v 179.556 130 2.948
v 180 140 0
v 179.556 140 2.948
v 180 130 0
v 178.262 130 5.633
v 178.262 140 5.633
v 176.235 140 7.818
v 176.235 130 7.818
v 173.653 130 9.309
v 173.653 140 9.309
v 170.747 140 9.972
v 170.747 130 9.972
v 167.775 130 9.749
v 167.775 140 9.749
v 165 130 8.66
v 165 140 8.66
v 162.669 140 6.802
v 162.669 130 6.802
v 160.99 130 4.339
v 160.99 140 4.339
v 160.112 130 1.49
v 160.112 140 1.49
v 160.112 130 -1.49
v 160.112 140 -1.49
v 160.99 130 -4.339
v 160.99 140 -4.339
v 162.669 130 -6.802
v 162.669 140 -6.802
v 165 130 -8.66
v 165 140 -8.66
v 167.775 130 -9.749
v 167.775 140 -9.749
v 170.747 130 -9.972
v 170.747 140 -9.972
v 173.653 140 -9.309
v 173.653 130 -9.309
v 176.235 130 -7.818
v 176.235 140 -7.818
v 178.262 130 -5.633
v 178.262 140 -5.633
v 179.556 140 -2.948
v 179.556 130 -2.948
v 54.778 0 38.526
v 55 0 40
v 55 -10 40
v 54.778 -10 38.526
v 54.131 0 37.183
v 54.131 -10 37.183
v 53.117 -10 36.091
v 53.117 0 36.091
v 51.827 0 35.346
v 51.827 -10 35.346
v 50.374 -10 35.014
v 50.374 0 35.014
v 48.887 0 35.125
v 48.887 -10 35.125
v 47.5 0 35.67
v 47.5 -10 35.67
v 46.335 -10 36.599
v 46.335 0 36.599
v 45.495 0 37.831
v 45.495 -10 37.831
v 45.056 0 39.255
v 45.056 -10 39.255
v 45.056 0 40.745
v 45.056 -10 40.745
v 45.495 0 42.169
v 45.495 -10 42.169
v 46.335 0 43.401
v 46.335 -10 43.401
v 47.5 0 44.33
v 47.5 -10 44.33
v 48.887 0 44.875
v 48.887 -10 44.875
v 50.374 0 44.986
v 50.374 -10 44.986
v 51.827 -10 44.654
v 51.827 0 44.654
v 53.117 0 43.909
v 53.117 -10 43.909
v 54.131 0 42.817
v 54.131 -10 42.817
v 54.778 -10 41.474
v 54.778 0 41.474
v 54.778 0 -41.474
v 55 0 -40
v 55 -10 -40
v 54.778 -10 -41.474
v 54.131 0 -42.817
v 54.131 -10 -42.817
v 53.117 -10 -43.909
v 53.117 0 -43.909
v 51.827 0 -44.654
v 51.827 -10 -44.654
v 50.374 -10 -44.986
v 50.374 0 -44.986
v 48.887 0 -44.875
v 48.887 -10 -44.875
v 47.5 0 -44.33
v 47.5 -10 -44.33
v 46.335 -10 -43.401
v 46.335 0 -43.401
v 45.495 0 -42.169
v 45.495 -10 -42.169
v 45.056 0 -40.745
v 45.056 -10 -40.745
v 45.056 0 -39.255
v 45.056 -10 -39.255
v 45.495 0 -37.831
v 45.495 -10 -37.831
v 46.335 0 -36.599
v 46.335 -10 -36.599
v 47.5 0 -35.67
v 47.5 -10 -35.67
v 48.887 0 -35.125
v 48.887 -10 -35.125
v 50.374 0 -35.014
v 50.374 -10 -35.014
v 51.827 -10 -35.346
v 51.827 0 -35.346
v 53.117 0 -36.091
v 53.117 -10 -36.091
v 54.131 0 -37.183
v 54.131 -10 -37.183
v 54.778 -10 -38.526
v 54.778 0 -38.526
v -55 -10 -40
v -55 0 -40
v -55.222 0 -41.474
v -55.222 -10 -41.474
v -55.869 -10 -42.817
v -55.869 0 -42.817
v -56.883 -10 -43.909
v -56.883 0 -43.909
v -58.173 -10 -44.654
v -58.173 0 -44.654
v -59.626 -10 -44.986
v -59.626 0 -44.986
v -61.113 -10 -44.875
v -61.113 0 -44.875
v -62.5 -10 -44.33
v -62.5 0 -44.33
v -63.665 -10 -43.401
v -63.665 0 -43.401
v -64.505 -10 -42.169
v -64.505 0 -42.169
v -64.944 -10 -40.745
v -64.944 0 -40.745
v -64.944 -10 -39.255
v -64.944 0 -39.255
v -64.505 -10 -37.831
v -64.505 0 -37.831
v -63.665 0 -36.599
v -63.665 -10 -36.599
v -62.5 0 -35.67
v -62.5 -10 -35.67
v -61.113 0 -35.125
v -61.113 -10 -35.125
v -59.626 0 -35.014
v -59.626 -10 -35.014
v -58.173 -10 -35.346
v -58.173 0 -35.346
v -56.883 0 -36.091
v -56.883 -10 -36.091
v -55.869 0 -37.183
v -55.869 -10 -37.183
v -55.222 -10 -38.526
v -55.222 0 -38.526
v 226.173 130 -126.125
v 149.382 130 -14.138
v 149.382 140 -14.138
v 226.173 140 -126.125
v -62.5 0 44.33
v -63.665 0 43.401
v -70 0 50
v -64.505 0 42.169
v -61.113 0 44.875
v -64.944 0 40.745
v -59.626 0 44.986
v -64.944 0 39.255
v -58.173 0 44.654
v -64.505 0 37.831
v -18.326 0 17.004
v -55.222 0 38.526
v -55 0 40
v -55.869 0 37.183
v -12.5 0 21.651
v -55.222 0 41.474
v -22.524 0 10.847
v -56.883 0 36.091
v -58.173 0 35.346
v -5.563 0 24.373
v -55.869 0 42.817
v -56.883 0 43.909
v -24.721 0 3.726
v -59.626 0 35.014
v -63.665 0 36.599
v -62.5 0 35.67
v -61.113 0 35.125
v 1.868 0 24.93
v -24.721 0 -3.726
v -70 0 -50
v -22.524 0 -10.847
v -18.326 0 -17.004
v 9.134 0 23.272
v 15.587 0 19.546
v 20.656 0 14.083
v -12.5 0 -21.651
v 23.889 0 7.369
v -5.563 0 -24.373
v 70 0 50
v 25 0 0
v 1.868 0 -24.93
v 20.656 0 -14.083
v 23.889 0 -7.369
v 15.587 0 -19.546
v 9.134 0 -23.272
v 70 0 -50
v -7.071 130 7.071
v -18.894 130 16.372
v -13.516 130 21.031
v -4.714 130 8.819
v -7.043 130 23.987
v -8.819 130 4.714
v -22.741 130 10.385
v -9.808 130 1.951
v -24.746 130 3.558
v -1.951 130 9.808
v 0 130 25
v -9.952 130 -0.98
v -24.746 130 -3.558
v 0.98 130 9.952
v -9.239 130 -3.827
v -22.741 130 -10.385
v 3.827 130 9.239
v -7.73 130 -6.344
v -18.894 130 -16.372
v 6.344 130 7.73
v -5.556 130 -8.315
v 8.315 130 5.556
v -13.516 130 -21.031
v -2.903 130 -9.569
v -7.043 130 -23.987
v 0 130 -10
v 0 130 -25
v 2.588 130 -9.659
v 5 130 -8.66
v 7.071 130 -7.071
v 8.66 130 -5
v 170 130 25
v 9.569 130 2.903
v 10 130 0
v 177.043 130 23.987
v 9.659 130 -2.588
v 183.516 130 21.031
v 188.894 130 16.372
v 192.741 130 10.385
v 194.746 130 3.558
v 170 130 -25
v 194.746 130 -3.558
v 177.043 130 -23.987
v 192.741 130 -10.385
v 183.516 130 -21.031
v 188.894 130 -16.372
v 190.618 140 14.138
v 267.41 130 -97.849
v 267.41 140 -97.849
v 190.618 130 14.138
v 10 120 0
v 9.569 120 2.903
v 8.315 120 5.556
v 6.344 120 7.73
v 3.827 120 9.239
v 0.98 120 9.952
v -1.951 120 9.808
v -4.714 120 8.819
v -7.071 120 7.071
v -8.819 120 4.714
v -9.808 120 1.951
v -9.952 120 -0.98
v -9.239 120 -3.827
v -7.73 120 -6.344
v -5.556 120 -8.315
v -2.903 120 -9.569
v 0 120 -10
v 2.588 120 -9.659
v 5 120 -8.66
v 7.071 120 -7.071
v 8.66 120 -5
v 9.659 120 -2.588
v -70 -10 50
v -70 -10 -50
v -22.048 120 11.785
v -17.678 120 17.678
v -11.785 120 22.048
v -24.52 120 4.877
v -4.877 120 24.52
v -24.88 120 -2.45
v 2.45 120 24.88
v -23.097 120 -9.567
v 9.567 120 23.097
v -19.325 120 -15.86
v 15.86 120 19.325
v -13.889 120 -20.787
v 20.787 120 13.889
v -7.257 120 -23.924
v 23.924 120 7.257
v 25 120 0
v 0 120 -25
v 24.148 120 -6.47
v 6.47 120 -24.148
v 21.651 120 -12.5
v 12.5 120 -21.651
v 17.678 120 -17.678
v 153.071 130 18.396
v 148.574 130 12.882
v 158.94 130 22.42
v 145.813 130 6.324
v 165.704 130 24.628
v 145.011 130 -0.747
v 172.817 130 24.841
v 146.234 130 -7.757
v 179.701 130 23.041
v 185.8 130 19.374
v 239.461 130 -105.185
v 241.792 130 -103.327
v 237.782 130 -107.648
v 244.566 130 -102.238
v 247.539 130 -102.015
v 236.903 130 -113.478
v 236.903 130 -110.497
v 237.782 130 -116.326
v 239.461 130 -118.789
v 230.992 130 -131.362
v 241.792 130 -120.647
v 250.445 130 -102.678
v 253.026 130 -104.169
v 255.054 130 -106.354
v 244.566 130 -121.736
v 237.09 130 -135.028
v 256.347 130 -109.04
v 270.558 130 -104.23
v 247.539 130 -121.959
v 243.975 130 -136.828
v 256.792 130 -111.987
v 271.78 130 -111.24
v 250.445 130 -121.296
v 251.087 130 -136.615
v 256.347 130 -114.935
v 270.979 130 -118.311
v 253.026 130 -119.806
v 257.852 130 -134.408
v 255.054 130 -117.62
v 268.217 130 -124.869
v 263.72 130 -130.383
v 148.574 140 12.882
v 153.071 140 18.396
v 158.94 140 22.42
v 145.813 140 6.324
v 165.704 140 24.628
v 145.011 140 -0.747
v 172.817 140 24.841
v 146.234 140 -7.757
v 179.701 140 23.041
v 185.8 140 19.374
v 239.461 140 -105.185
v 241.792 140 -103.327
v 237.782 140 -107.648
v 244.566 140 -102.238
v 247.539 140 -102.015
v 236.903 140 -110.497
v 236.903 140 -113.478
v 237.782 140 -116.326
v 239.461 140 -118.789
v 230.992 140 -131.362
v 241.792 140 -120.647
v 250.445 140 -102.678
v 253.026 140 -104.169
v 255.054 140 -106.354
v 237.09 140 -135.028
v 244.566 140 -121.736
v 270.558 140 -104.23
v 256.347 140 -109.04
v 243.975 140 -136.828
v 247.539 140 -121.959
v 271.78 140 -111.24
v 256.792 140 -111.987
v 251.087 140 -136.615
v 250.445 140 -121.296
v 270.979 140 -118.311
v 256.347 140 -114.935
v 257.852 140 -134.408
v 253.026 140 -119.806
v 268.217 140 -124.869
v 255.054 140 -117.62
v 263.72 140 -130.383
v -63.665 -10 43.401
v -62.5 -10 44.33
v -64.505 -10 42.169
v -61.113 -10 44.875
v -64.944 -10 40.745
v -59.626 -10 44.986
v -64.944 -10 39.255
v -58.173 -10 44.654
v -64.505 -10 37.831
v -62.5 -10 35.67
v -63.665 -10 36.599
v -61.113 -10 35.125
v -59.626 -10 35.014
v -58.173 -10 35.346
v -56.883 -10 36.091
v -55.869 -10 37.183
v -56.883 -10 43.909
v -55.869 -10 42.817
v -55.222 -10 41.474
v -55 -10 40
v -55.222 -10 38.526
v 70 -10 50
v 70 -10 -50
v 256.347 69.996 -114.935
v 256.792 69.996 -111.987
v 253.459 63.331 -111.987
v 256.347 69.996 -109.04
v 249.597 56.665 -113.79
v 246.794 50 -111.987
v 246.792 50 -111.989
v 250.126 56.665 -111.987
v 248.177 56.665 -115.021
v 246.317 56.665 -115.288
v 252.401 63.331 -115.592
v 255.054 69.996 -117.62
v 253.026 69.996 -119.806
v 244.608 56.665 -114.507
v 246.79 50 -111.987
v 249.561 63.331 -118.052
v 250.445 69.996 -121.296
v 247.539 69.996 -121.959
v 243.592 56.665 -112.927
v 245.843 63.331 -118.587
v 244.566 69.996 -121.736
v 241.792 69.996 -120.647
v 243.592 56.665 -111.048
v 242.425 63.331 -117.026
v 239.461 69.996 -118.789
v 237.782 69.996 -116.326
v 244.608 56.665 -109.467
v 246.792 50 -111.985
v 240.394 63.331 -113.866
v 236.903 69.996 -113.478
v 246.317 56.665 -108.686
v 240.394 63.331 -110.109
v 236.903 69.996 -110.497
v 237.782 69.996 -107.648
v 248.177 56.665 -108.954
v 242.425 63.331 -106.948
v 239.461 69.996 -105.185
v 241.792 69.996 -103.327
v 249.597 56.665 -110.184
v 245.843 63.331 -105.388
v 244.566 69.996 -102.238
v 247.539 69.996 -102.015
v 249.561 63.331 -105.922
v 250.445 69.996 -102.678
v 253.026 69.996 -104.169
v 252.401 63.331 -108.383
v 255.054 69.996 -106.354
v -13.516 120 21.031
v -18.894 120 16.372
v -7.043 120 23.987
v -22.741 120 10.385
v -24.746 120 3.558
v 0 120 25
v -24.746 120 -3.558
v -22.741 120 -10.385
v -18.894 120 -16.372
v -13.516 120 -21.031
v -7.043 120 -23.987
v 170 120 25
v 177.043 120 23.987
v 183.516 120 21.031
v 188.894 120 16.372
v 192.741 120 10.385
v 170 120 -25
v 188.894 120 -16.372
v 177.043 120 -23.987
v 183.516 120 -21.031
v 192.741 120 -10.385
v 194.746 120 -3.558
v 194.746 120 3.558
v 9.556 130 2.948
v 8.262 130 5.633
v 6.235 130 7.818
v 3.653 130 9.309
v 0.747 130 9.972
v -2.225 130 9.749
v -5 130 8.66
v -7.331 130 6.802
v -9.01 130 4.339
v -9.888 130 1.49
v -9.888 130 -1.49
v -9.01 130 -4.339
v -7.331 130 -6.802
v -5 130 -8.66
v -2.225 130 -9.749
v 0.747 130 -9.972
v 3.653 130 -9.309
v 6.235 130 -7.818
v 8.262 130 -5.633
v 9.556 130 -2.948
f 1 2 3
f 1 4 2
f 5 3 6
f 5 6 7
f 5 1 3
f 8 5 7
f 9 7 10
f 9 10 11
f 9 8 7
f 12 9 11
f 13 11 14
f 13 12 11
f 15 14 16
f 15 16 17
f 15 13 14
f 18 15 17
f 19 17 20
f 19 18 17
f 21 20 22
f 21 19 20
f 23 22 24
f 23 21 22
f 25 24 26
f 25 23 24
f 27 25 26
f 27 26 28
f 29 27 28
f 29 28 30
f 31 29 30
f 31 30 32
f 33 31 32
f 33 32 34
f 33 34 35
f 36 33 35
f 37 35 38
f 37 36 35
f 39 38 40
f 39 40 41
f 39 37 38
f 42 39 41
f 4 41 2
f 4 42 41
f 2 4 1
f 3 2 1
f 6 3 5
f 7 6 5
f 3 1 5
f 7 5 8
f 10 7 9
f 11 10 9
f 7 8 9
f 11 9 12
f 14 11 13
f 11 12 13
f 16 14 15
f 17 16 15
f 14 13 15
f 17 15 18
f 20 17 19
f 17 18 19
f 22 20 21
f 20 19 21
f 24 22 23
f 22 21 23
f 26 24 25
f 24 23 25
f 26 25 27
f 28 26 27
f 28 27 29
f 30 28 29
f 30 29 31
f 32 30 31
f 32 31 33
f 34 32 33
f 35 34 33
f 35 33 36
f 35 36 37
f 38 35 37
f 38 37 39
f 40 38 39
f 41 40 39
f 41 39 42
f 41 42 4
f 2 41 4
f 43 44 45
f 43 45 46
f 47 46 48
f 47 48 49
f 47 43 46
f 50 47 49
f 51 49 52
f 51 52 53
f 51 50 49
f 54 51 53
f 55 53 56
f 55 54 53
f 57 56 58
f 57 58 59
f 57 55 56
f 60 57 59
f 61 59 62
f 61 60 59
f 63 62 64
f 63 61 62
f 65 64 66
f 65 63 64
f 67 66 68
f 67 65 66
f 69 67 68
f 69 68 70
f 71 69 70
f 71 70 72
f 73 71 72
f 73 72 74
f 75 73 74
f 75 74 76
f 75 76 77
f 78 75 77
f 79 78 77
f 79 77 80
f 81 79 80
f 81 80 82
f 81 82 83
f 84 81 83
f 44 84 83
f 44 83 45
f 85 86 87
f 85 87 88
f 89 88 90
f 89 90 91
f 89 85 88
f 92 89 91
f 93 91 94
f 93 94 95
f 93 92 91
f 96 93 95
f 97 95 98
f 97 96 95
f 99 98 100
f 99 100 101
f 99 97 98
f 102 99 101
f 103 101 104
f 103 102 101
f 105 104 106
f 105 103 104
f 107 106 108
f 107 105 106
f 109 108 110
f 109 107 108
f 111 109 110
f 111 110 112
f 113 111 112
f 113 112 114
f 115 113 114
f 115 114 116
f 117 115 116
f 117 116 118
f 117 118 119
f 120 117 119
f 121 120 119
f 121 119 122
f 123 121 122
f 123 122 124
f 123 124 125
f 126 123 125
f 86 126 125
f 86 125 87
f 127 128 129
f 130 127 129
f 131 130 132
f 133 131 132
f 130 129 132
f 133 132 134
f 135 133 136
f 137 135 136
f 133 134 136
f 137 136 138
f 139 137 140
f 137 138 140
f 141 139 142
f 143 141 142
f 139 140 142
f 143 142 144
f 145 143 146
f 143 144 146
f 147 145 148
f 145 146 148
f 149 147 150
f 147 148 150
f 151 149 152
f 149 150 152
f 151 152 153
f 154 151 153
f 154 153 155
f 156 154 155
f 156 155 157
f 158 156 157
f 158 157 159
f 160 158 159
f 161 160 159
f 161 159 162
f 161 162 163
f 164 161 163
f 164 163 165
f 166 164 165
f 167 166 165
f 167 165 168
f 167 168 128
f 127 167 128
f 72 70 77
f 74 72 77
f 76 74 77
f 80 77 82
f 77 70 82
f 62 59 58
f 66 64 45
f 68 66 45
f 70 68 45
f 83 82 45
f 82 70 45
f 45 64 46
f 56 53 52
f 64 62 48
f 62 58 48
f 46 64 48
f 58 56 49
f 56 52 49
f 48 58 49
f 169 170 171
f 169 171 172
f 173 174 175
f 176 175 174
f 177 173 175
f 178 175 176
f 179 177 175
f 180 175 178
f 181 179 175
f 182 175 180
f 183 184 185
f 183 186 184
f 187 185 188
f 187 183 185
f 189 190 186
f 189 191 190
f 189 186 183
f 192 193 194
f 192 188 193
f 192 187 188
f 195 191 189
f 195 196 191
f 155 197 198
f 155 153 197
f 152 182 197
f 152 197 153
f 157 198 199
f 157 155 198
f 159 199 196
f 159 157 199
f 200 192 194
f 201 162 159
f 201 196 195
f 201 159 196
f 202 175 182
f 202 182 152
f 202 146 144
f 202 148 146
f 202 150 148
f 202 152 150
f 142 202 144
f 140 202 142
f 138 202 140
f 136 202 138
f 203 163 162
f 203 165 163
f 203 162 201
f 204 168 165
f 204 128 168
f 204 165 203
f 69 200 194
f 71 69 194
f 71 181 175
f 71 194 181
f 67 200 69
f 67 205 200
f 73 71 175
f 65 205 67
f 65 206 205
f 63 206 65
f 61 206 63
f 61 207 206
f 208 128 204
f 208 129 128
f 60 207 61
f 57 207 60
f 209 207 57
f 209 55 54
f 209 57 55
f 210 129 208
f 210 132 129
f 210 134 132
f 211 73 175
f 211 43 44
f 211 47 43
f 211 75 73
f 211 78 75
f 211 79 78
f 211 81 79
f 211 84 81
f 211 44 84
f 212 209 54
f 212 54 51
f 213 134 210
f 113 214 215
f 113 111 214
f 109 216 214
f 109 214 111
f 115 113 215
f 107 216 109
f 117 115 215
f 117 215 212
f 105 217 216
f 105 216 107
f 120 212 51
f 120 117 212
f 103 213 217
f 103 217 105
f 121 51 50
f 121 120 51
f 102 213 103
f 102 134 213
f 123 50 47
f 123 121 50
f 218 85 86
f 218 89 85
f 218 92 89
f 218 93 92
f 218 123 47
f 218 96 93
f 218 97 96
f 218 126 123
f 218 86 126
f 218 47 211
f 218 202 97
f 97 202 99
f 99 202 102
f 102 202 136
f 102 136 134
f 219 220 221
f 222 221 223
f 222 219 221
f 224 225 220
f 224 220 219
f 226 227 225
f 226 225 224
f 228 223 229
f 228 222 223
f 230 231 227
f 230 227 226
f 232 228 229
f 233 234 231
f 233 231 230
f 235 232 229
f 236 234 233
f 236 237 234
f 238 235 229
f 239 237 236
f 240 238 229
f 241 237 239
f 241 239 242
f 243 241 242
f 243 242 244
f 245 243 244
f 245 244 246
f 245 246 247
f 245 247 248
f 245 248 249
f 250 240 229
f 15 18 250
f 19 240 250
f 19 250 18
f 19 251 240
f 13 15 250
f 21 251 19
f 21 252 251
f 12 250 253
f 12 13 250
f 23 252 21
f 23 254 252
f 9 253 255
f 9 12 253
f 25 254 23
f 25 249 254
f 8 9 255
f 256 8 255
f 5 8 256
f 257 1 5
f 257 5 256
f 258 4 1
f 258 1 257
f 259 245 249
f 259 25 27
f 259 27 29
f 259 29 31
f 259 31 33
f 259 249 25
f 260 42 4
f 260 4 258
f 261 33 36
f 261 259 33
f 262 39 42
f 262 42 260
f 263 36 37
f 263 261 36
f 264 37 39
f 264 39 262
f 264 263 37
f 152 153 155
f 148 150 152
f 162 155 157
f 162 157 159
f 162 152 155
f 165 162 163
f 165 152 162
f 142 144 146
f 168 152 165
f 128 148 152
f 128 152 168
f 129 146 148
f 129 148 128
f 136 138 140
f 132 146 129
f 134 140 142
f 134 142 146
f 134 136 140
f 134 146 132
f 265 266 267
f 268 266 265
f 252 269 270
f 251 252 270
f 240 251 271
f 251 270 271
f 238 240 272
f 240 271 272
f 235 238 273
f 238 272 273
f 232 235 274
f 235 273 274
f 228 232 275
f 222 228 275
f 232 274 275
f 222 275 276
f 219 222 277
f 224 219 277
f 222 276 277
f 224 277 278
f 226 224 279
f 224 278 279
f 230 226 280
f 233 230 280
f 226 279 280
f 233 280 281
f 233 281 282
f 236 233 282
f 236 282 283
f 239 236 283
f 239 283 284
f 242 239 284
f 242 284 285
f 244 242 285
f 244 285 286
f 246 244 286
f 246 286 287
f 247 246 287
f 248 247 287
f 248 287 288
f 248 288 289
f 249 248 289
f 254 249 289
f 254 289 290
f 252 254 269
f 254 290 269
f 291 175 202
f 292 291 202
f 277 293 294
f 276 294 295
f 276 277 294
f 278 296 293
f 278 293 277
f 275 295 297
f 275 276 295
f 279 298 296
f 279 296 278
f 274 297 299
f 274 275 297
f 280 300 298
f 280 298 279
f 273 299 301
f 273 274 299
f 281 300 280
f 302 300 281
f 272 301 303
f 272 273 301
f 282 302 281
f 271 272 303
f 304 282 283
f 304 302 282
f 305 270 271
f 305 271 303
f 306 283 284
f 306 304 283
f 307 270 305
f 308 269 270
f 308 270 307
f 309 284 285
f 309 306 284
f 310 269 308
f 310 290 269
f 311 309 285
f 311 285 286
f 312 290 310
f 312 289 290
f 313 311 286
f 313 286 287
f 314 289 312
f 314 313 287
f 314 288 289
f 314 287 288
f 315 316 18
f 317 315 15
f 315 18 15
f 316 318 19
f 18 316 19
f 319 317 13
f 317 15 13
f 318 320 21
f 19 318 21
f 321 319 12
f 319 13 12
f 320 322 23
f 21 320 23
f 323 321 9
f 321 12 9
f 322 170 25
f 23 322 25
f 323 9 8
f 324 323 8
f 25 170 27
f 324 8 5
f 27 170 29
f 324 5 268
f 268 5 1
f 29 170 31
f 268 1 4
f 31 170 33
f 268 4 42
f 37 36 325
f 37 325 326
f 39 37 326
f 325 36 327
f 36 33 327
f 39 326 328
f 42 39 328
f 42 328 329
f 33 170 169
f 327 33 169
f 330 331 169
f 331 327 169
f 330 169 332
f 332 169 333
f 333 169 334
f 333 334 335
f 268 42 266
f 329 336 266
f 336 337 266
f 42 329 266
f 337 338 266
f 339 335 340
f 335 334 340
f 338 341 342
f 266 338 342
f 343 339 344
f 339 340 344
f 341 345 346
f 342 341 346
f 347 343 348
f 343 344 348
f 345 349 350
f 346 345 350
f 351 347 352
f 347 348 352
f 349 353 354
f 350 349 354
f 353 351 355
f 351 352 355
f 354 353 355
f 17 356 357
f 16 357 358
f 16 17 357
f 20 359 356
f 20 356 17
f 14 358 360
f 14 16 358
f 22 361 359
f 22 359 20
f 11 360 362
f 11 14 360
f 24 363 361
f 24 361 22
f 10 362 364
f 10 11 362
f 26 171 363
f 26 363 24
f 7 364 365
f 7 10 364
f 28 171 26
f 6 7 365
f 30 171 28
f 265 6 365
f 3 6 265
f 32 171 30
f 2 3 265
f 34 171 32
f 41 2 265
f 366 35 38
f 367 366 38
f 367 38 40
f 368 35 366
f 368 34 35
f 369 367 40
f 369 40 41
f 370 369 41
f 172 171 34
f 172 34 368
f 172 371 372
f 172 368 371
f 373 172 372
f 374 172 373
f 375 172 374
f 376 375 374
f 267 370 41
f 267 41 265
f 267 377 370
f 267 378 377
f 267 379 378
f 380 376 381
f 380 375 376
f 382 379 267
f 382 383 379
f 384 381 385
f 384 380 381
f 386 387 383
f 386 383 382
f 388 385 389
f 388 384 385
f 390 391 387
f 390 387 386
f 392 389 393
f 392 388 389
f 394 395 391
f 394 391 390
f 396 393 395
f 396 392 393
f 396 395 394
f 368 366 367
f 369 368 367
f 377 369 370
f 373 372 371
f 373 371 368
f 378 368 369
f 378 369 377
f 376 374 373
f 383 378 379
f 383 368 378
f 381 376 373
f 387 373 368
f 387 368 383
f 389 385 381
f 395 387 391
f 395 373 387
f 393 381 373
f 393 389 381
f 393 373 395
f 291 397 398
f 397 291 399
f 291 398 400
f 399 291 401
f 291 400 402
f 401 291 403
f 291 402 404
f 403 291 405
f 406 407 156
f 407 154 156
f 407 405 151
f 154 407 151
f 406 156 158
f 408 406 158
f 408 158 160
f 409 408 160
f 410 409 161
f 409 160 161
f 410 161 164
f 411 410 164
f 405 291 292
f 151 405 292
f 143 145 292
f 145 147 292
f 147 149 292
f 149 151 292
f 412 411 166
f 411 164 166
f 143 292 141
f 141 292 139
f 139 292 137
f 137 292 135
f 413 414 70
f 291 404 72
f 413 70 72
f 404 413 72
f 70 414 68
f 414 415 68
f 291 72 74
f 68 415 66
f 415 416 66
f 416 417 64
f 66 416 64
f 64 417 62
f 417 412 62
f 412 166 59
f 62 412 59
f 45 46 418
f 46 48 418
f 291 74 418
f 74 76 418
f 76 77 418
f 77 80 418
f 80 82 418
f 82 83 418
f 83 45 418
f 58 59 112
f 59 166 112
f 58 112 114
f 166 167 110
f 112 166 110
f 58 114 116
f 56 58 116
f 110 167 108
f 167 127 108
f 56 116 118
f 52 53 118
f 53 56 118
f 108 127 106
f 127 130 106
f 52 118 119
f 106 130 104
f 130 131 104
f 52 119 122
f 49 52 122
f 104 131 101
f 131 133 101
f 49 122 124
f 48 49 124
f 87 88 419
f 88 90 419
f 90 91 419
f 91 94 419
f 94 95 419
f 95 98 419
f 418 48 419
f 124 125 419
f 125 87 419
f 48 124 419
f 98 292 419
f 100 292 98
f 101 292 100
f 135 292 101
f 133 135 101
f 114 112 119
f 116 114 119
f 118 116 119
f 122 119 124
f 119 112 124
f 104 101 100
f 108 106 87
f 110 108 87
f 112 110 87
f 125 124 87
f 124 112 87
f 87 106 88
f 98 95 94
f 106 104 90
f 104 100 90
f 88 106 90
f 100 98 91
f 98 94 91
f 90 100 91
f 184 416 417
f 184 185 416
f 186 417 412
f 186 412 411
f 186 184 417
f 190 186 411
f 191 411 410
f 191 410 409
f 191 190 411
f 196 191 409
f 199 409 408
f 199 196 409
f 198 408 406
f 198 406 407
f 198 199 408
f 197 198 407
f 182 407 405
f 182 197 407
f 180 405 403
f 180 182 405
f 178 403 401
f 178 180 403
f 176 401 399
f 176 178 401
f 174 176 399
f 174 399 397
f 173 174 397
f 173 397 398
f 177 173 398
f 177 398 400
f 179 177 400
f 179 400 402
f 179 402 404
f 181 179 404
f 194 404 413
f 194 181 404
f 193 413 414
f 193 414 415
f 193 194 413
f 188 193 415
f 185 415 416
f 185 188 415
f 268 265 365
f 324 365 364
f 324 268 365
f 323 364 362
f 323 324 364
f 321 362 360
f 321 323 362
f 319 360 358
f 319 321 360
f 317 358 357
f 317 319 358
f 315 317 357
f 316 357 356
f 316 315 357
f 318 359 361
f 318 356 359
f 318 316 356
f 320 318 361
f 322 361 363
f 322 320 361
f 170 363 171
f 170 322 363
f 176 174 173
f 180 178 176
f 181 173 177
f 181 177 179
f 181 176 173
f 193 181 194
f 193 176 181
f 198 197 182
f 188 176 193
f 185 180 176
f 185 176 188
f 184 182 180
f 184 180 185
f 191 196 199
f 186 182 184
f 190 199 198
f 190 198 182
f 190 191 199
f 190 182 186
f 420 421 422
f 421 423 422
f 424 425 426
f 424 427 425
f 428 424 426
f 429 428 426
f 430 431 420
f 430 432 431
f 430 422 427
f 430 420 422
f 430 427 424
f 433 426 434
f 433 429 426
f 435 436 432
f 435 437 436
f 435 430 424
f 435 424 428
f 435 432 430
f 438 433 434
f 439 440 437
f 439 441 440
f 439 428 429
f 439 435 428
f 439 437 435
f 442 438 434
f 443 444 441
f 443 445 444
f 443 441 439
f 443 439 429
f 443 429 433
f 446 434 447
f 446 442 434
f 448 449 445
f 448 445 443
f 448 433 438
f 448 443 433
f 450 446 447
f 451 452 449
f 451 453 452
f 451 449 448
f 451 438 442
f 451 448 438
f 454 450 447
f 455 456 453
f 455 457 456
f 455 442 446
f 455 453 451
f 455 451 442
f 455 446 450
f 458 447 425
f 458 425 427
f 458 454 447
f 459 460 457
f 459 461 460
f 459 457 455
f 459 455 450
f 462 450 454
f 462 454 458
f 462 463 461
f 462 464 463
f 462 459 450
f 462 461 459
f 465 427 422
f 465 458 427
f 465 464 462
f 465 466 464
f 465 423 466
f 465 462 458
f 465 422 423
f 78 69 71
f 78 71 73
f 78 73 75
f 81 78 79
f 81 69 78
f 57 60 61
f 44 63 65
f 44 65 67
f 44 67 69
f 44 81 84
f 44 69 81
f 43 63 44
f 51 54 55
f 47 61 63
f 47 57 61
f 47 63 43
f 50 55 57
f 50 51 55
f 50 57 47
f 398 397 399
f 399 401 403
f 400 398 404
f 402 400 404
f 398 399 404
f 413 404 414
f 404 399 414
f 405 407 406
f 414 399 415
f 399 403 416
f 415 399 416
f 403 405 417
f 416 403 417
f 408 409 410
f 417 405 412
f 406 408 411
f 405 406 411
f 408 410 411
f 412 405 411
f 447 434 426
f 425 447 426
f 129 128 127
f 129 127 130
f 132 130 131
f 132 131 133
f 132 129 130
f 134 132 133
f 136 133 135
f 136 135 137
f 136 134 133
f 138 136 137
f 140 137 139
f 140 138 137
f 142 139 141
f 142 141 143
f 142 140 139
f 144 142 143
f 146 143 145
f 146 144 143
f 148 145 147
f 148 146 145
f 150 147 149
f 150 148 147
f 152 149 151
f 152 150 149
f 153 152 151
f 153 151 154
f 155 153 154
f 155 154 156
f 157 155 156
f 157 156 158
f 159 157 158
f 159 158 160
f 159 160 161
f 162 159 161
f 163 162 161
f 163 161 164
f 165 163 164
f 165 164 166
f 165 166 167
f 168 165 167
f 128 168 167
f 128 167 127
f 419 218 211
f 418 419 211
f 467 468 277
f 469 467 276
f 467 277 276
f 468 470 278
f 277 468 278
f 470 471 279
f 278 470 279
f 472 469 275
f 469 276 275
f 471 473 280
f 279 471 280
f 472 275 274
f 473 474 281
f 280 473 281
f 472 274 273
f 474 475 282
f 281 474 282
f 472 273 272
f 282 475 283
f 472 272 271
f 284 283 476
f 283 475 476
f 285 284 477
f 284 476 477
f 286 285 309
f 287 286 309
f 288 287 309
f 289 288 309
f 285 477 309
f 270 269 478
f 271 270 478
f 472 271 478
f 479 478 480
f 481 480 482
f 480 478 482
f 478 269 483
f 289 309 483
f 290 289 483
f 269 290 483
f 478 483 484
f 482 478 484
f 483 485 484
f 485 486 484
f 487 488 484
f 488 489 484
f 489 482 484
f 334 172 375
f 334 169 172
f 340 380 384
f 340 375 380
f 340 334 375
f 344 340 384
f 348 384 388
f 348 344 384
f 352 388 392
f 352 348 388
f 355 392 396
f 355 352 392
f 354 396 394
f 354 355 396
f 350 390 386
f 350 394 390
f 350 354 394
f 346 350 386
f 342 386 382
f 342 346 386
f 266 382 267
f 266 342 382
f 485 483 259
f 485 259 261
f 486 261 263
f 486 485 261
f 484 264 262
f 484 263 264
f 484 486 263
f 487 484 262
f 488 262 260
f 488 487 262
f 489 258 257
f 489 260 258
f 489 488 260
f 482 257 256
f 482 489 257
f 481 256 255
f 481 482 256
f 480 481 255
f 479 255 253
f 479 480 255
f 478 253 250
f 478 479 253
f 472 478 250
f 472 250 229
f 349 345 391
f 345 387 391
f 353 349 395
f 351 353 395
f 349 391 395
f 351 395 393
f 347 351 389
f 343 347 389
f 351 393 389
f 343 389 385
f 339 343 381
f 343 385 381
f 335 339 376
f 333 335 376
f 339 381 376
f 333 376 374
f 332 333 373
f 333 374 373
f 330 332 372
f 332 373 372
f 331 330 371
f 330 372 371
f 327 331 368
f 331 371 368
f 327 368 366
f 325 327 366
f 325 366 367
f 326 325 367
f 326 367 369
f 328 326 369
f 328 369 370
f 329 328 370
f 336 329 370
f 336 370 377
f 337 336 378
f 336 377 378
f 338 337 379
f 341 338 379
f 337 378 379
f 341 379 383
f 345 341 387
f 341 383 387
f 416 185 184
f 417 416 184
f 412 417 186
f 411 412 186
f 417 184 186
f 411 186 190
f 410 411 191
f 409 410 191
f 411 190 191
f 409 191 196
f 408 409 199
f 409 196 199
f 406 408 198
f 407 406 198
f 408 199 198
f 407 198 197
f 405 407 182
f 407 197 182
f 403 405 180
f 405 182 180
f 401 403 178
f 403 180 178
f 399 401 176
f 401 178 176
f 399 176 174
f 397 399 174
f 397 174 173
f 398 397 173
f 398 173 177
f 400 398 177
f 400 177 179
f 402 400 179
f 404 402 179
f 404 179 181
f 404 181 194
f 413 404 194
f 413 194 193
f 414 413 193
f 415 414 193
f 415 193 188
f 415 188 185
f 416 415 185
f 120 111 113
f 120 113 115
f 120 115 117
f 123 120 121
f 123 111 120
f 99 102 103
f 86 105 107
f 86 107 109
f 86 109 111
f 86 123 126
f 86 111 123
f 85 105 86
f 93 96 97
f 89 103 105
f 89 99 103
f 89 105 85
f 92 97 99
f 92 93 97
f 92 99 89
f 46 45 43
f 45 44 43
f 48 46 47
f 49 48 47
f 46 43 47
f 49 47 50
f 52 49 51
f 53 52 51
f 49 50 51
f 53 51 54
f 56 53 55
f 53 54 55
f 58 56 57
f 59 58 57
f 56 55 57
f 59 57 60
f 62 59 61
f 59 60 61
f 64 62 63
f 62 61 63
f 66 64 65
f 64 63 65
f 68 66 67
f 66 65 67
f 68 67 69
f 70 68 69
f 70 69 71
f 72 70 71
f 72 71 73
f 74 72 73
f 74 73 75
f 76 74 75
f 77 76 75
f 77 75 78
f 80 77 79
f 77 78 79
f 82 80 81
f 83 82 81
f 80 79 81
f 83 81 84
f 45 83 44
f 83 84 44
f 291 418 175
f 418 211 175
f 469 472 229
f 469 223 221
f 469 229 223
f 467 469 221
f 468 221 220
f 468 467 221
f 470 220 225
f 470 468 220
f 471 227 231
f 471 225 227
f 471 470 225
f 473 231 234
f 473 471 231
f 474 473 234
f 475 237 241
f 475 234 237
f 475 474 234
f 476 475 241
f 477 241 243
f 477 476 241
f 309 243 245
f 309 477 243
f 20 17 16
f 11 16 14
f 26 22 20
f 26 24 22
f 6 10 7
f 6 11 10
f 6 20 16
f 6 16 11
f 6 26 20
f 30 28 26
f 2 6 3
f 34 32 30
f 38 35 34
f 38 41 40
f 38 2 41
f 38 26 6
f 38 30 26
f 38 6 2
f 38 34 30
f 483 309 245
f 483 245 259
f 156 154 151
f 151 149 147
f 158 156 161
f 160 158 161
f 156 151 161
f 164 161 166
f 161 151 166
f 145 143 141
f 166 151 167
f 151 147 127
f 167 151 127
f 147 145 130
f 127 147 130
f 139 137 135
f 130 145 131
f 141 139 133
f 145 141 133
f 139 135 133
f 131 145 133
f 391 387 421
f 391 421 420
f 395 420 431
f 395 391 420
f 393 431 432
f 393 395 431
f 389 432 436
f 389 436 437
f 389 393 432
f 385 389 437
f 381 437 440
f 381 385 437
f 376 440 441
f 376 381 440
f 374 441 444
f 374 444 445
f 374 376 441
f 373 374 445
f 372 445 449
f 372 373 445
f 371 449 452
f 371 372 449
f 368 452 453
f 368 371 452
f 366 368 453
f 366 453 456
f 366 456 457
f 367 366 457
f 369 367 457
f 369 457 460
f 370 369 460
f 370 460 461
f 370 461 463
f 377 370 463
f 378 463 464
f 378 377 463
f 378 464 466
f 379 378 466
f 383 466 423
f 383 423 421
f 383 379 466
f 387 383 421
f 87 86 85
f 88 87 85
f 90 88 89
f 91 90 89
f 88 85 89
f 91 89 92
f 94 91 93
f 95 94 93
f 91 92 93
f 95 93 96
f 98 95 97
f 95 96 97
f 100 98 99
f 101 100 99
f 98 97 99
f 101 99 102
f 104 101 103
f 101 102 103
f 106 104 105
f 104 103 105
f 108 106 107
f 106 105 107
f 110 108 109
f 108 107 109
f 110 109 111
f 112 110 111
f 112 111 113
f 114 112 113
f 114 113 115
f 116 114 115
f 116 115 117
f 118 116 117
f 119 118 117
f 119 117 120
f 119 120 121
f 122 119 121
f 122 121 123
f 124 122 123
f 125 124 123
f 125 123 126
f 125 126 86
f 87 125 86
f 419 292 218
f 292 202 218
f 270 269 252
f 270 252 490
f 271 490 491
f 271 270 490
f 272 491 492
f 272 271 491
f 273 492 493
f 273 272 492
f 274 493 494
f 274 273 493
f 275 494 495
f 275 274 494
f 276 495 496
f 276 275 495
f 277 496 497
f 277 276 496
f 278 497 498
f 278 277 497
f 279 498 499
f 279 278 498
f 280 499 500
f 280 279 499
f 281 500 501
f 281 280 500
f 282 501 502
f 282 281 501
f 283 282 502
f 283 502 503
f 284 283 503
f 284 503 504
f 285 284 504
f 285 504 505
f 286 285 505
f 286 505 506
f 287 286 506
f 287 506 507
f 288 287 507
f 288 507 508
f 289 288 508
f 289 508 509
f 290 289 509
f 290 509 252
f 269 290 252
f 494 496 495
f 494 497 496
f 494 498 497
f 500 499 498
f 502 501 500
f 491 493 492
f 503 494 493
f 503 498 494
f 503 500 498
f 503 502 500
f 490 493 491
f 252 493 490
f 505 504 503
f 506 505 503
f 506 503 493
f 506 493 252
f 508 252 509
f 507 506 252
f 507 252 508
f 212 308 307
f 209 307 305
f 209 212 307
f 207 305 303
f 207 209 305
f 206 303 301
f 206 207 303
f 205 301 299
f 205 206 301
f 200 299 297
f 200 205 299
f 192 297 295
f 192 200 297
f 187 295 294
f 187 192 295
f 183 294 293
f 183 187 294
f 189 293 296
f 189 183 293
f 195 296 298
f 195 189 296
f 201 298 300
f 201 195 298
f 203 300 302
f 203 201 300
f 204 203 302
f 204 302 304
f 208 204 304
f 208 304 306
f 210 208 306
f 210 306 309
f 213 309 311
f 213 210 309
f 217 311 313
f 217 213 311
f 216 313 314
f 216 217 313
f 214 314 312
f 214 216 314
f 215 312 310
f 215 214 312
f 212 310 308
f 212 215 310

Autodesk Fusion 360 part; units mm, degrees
sketch "Sketch1" plane through (0, 0, 0) normal (0, 1, 0) x (1, 0, 0)
  line L0 (-70, 50) -> (70, 50)
  line L1 (70, 50) -> (70, -50)
  line L2 (70, -50) -> (-70, -50)
  line L3 (-70, -50) -> (-70, 50)
  circle A0 centre (0, 0) radius 25
  circle A1 centre (-60, -40) radius 5
  circle A2 centre (-60, 40) radius 5
  circle A3 centre (50, 40) radius 5
  circle A4 centre (50, -40) radius 5
  line L4 (0, 0) -> (0, 25)
  line L5 (0, 25) -> (170, 25)
  line L6 (170, -25) -> (0, -25)
  arc A5 (170, -25) -> (170, 25) centre (170, 0) ccw
  arc A6 (170, 25) -> (170, -25) centre (170, 0) ccw
  line L7 (170, 0) -> (190.6182, -14.1383)
  line L8 (170, 0) -> (149.3818, 14.1383)
  line L9 (149.3818, 14.1383) -> (226.1734, 126.1254)
  line L10 (267.4098, 97.8489) -> (190.6182, -14.1383)
  arc A7 (267.4098, 97.8489) -> (226.1734, 126.1254) centre (246.7916, 111.9872) ccw
  arc A8 (226.1734, 126.1254) -> (267.4098, 97.8489) centre (246.7916, 111.9872) ccw
  circle A9 centre (246.7916, 111.9872) radius 10
  circle A10 centre (0, 0) radius 10
  circle A11 centre (170, 0) radius 10
  dimension "d1" = 50
  dimension "d2" = 10
  dimension "d4" = 50
  dimension "d5" = 20
  dimension "d28" = 20
  dimension "d29" = 20
extrude "Extrude1" add sketch "Sketch1" against normal blind 10 contours L0 L1 L2 L3 A0 L5 L6 | L1 A0 L5 L6 | A0 | A10 makes body 1
extrude "Extrude2" add sketch "Sketch1" against normal blind 10 separate body contours A1 | A2 | A3 | A4 makes body 2 at (-55.0062, -6.6667, 40.2492) makes body 3 at (54.9938, -6.6667, 40.2492) makes body 4 at (-55.0062, -6.6667, -39.7508) makes body 5 at (54.9938, -6.6667, -39.7508)
extrude "Extrude3" add sketch "Sketch1" along normal blind 120 separate body contours A0 | A10 makes body 6
extrude "Extrude4" add sketch "Sketch1" along normal blind 10 from surface at 120 separate body contours L1 L5 L6 A6 L9 | L1 A0 L5 L6 | A0 | A10 | L5 A6 L9 | A5 A6 L7 L8 A11 | A5 A6 L7 L8 A11 | L7 L8 A11 | L7 L8 A11 makes body 7
extrude "Extrude5" add sketch "Sketch1" along normal blind 10 from surface at 130 separate body contours L5 A5 L9 L10 A8 | L5 A6 L9 | A5 A6 L7 L8 A11 | A5 A6 L7 L8 A11 | A7 A8 | L7 L8 A11 | L7 L8 A11 | A9 makes body 8
extrude "Extrude6" cut sketch "Sketch1" along normal blind 10 and the other way blind 30 from surface at 140 contours A9 bodies 8
extrude "Extrude7" add sketch "Sketch1" along normal blind 10 and the other way blind 80 from surface at 140 separate body contours A9 makes body 9
extrude "Extrude8" cut sketch "Sketch1" along normal blind 170 contours A10 bodies 7
extrude "Extrude9" cut sketch "Sketch1" along normal blind 180 contours L7 L8 A11 | L7 L8 A11 bodies 7 8
extrude "Extrude10" cut sketch "Sketch1" against normal blind 120 from surface at 120 contours A10 bodies 6
extrude "Extrude1'" add sketch "Sketch1" along normal blind 130 separate body contours A10 makes body 10 in component "Rod BH1"
extrude "Extrude1''" add sketch "Sketch1" along normal mid plane 20 from surface at 130 separate body contours L7 L8 A11 | L7 L8 A11 makes body 11 in component "Rod H1H2"
combine "Combine1" operation add target body 7 tool bodies 11
combine "Combine2" operation add target body 1 tool bodies 10
combine "Combine3" operation add target body 1 tool bodies 6
copy_body "Body->Comp2" bodies 1 removing the originals makes body 12 in component "Base"
copy_body "Body->Comp3" bodies 7 removing the originals makes body 13 in component "Arm1"
copy_body "Body->Comp4" bodies 8 removing the originals makes body 14 in component "Arm2"
copy_body "Body->Comp5" bodies 9 removing the originals makes body 15 in component "End Effector"
chamfer "Chamfer1" distance 10 distance2 20 1 edges at (237.4683, 60, -115.6033) measured on face at (249.6761, 60, -105.9975) on bodies 15 in component "End Effector"
component "Base" placed x (1, 0, 0) y (0, 1, 0) z (0, 0, 1) at (0, 0, 0)
component "Arm1" placed x (1, 0, 0) y (0, 1, 0) z (0, 0, 1) at (0, 0, 0)
component "Arm2" placed x (1, 0, 0) y (0, 1, 0) z (0, 0, 1) at (0, 0, 0)
component "End Effector" placed x (1, 0, 0) y (0, 1, 0) z (0, 0, 1) at (0, -10, 0)
